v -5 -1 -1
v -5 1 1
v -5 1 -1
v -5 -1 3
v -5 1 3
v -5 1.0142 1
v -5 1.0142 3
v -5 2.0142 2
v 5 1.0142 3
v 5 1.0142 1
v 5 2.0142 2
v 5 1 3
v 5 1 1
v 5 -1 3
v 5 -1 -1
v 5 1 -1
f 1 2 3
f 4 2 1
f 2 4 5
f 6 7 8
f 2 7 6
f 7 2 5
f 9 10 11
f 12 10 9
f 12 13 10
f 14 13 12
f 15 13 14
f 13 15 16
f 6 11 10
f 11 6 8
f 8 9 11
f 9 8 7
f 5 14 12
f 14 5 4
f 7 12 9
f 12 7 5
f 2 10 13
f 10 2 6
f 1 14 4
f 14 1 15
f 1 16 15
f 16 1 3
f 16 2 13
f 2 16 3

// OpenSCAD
// Cube with rounded corners
// roundedCornerCube (50,50,4);
module roundedCornerCube(length, width, thickness){

        hull()
        {
            translate([length/2 - 2, width/2 - 2, 0]) cylinder(r=2, h=thickness, $fn=50, center=true);
            translate([length/2 - 2, -width/2 + 2, 0]) cylinder(r=2, h=thickness, $fn=50, center=true);
            translate([-length/2 + 2, width/2 - 2, 0]) cylinder(r=2, h=thickness, $fn=50, center=true);
            translate([-length/2 + 2, -width/2 + 2, 0]) cylinder(r=2, h=thickness, $fn=50, center=true);
        }

}

// Hollow cube with rounded corners. Will look like a frame with rounded con
// hollowRoundedCornerCube(50,70,4,2);
module hollowRoundedCornerCube(length, width, thickness, wallthickness)
{
    difference()
    {
        roundedCornerCube(length,width,thickness);
        roundedCornerCube(length-(wallthickness*2),width-(wallthickness*2),thickness);
    }
}

/*
module cylinderWithHandle(radius, thickness)
{
    rotate_extrude($fn=100)
        polygon( points = [[0,0], [radius,0], [radius,thickness] , [1,thickness], [2,thickness + 2] , [2,thickness + 6],[0,thickness + 6]] );
}
*/


// hollow cylinder
// hollowCylinder(radius, height, wallThickness)
// radius : radius to outter wall
// wallThickness : Thickness of wall
module hollowCylinder(radius, height, wallThickness)
{

    difference()
    {
        cylinder(h=height, r1=radius, r2=radius);
        translate([0,0,-.02]) cylinder(h=height + .04, r1=radius - wallThickness, r2=radius - wallThickness);
    }
}


// hollow cylinders
// hollowCylinders(20, 10, 2, 2, 2)
// radius : radius to outer wall
// gapsSize : size of gap between each rings
// minradius : radius of the smallest ring
module hollowCylinders(radius, height, wallThickness, gapSize, minRadius)
{
    for (i = [radius : -(gapSize + wallThickness) : minRadius])
    {
       //echo (i);
       hollowCylinder(i,height,wallThickness);
    }
}

//
// b = bottom diameter
// t = top diameter
// h = height
module cone(b, t, h)
{
    cylinder(h=h, r1=b/2, r2=t/2, $fn=100);
}

// hollowCone(10,4,20, 2)
module hollowCone(bottomRadius, topRadius, height, wallThickness)
{
    difference()
    {
        cylinder(h=height, r1=bottomRadius, r2=topRadius, $fn=100);
        translate([0,0,-.02]) cylinder(h=height, r1=bottomRadius - wallThickness, r2=topRadius - wallThickness, $fn=100);
    }
}


// w = width between flat surface
// h = height
module hex (w=10, h=2){
  cylinder (r=w/2, h=h, center=true, $fn=6);
}

// hollowCone(10,4,20, 2)
module hollowHex(w=10, h=2, th=2)
{
    difference()
    {
        cylinder (r=w/2, h=h, center=true, $fn=6);
        cylinder (r=w/2 - th, h=h, center=true, $fn=6);
    }
}

// h : height
// ns : number of sides for base
// br : bottom radius
// tr : top radius
// ro : rotation in degree between bottom and top
// sl : slice layer. high value give smooth appearence
module twistExtrude(h=50,ns=6,br=20,tr=20,ro=100,sl=5)
{

	linear_extrude(height = h, twist  = ro,	slices = sl, scale  = tr/br)
		circle(r=br, $fn=ns);
}


// h : height
// ns : number of sides for base
// br : bottom radius
// tr : top radius
// ro : rotation in degree between bottom and top
// sl : slice layer. high value give smooth appearence
// wt : wall thickness
module hollowTwistExtrude(h=50,ns=6,br=20,tr=20,ro=100,sl=5,wt=1)
{
	difference()
	{
		linear_extrude(height = h, twist  = ro,	slices = sl, scale  = tr/br)
			circle(r=br, $fn=ns);

    translate([0,0,-.01])
		linear_extrude(height = h + .1, twist  = ro,	slices = sl, scale  = tr/br)
			circle(r=br - wt, $fn=ns);
	}
}


///////////////////////////////////////////////////////////////////////////////////////////////////////////////////

// honeycomb tiles
// honeycombSquare(100,100,4,10,2);
module honeycombTiles(length, width,thickness,rad,wallThickness)
{
    //thickness = 4;
    //rad = 10;
    //wallThickness = 2;
    //length = 100;
    //width = 100;

    for (w=[0: width/rad])
    {

        if (w % 2 == 0)
        {
            //cylinder($fn=6, r=rad, h=2);
            for (i = [0 : length/((rad*2) + (wallThickness*2))])
            {
              translate([rad*(3*i) + (wallThickness*2)*i,w*rad,0]) cylinder($fn=6, r=rad, h=thickness);

              //translate([rad*6 + (wallThickness*2)*2,0,0]) cylinder($fn=6, r=10, h=2);
              //translate([rad*9 + (wallThickness*2)*3,0,0]) cylinder($fn=6, r=10, h=2);
            }
        }

        if (w % 2 == 1)
        {
            for (j = [1 : 2 : (length/(rad + wallThickness))])
            {
              translate([(rad*1.5) *j + wallThickness *j , (w*rad) + wallThickness/2 ,0])  cylinder($fn=6, r=rad, h=thickness);
                //translate([(rad*1.5) *3 + wallThickness *3 ,10,0]) circle($fn=6, r=10);
                //translate([(rad*1.5) *5 + wallThickness *5 ,10,0]) circle($fn=6, r=10);
            }
        }
    }
}

// honeycomb square
// A square area with hollow honeycomb design
// honeycombSquare(100,100,4,10,2);
module honeycombSquare(length, width, thickness, cellRad,wallThickness)
{
    difference()
    {
        cube([length,width,thickness], center=true);
        translate([-length/2,-width/2, -thickness/2]) honeycombTiles(length,width,thickness,cellRad,wallThickness);
    }
}

//honeycomb(length, width, height, cell_size, wall_thickness);
//honeycomb(50, 50, 4, 10, 1);
//hollowRoundedCornerCube(50,70,4,2);

//hollowCylinder(10,20,2);

//hollowCylinders(20, 10, 2, 2, 2);
//cone(10,2,20);

// hollowCone(10,4,20, 2);

// honeycombSquare(40,40,2,5,2);


module edgeClamp(l=10)
{
   difference()
   {
    translate([0,.6,0]) rotate([45,0,0]) cube([l,2,2], center=true);
    translate([0,.6,1.5]) cube([l + .1,1,1], center=true);
    translate([0,.6,-1.5]) cube([l + .1,1,1], center=true);
   }
   cube([l,2,2], center=true);
}

cube([10,2,2], center=true);
translate([0,0,2]) edgeClamp();
